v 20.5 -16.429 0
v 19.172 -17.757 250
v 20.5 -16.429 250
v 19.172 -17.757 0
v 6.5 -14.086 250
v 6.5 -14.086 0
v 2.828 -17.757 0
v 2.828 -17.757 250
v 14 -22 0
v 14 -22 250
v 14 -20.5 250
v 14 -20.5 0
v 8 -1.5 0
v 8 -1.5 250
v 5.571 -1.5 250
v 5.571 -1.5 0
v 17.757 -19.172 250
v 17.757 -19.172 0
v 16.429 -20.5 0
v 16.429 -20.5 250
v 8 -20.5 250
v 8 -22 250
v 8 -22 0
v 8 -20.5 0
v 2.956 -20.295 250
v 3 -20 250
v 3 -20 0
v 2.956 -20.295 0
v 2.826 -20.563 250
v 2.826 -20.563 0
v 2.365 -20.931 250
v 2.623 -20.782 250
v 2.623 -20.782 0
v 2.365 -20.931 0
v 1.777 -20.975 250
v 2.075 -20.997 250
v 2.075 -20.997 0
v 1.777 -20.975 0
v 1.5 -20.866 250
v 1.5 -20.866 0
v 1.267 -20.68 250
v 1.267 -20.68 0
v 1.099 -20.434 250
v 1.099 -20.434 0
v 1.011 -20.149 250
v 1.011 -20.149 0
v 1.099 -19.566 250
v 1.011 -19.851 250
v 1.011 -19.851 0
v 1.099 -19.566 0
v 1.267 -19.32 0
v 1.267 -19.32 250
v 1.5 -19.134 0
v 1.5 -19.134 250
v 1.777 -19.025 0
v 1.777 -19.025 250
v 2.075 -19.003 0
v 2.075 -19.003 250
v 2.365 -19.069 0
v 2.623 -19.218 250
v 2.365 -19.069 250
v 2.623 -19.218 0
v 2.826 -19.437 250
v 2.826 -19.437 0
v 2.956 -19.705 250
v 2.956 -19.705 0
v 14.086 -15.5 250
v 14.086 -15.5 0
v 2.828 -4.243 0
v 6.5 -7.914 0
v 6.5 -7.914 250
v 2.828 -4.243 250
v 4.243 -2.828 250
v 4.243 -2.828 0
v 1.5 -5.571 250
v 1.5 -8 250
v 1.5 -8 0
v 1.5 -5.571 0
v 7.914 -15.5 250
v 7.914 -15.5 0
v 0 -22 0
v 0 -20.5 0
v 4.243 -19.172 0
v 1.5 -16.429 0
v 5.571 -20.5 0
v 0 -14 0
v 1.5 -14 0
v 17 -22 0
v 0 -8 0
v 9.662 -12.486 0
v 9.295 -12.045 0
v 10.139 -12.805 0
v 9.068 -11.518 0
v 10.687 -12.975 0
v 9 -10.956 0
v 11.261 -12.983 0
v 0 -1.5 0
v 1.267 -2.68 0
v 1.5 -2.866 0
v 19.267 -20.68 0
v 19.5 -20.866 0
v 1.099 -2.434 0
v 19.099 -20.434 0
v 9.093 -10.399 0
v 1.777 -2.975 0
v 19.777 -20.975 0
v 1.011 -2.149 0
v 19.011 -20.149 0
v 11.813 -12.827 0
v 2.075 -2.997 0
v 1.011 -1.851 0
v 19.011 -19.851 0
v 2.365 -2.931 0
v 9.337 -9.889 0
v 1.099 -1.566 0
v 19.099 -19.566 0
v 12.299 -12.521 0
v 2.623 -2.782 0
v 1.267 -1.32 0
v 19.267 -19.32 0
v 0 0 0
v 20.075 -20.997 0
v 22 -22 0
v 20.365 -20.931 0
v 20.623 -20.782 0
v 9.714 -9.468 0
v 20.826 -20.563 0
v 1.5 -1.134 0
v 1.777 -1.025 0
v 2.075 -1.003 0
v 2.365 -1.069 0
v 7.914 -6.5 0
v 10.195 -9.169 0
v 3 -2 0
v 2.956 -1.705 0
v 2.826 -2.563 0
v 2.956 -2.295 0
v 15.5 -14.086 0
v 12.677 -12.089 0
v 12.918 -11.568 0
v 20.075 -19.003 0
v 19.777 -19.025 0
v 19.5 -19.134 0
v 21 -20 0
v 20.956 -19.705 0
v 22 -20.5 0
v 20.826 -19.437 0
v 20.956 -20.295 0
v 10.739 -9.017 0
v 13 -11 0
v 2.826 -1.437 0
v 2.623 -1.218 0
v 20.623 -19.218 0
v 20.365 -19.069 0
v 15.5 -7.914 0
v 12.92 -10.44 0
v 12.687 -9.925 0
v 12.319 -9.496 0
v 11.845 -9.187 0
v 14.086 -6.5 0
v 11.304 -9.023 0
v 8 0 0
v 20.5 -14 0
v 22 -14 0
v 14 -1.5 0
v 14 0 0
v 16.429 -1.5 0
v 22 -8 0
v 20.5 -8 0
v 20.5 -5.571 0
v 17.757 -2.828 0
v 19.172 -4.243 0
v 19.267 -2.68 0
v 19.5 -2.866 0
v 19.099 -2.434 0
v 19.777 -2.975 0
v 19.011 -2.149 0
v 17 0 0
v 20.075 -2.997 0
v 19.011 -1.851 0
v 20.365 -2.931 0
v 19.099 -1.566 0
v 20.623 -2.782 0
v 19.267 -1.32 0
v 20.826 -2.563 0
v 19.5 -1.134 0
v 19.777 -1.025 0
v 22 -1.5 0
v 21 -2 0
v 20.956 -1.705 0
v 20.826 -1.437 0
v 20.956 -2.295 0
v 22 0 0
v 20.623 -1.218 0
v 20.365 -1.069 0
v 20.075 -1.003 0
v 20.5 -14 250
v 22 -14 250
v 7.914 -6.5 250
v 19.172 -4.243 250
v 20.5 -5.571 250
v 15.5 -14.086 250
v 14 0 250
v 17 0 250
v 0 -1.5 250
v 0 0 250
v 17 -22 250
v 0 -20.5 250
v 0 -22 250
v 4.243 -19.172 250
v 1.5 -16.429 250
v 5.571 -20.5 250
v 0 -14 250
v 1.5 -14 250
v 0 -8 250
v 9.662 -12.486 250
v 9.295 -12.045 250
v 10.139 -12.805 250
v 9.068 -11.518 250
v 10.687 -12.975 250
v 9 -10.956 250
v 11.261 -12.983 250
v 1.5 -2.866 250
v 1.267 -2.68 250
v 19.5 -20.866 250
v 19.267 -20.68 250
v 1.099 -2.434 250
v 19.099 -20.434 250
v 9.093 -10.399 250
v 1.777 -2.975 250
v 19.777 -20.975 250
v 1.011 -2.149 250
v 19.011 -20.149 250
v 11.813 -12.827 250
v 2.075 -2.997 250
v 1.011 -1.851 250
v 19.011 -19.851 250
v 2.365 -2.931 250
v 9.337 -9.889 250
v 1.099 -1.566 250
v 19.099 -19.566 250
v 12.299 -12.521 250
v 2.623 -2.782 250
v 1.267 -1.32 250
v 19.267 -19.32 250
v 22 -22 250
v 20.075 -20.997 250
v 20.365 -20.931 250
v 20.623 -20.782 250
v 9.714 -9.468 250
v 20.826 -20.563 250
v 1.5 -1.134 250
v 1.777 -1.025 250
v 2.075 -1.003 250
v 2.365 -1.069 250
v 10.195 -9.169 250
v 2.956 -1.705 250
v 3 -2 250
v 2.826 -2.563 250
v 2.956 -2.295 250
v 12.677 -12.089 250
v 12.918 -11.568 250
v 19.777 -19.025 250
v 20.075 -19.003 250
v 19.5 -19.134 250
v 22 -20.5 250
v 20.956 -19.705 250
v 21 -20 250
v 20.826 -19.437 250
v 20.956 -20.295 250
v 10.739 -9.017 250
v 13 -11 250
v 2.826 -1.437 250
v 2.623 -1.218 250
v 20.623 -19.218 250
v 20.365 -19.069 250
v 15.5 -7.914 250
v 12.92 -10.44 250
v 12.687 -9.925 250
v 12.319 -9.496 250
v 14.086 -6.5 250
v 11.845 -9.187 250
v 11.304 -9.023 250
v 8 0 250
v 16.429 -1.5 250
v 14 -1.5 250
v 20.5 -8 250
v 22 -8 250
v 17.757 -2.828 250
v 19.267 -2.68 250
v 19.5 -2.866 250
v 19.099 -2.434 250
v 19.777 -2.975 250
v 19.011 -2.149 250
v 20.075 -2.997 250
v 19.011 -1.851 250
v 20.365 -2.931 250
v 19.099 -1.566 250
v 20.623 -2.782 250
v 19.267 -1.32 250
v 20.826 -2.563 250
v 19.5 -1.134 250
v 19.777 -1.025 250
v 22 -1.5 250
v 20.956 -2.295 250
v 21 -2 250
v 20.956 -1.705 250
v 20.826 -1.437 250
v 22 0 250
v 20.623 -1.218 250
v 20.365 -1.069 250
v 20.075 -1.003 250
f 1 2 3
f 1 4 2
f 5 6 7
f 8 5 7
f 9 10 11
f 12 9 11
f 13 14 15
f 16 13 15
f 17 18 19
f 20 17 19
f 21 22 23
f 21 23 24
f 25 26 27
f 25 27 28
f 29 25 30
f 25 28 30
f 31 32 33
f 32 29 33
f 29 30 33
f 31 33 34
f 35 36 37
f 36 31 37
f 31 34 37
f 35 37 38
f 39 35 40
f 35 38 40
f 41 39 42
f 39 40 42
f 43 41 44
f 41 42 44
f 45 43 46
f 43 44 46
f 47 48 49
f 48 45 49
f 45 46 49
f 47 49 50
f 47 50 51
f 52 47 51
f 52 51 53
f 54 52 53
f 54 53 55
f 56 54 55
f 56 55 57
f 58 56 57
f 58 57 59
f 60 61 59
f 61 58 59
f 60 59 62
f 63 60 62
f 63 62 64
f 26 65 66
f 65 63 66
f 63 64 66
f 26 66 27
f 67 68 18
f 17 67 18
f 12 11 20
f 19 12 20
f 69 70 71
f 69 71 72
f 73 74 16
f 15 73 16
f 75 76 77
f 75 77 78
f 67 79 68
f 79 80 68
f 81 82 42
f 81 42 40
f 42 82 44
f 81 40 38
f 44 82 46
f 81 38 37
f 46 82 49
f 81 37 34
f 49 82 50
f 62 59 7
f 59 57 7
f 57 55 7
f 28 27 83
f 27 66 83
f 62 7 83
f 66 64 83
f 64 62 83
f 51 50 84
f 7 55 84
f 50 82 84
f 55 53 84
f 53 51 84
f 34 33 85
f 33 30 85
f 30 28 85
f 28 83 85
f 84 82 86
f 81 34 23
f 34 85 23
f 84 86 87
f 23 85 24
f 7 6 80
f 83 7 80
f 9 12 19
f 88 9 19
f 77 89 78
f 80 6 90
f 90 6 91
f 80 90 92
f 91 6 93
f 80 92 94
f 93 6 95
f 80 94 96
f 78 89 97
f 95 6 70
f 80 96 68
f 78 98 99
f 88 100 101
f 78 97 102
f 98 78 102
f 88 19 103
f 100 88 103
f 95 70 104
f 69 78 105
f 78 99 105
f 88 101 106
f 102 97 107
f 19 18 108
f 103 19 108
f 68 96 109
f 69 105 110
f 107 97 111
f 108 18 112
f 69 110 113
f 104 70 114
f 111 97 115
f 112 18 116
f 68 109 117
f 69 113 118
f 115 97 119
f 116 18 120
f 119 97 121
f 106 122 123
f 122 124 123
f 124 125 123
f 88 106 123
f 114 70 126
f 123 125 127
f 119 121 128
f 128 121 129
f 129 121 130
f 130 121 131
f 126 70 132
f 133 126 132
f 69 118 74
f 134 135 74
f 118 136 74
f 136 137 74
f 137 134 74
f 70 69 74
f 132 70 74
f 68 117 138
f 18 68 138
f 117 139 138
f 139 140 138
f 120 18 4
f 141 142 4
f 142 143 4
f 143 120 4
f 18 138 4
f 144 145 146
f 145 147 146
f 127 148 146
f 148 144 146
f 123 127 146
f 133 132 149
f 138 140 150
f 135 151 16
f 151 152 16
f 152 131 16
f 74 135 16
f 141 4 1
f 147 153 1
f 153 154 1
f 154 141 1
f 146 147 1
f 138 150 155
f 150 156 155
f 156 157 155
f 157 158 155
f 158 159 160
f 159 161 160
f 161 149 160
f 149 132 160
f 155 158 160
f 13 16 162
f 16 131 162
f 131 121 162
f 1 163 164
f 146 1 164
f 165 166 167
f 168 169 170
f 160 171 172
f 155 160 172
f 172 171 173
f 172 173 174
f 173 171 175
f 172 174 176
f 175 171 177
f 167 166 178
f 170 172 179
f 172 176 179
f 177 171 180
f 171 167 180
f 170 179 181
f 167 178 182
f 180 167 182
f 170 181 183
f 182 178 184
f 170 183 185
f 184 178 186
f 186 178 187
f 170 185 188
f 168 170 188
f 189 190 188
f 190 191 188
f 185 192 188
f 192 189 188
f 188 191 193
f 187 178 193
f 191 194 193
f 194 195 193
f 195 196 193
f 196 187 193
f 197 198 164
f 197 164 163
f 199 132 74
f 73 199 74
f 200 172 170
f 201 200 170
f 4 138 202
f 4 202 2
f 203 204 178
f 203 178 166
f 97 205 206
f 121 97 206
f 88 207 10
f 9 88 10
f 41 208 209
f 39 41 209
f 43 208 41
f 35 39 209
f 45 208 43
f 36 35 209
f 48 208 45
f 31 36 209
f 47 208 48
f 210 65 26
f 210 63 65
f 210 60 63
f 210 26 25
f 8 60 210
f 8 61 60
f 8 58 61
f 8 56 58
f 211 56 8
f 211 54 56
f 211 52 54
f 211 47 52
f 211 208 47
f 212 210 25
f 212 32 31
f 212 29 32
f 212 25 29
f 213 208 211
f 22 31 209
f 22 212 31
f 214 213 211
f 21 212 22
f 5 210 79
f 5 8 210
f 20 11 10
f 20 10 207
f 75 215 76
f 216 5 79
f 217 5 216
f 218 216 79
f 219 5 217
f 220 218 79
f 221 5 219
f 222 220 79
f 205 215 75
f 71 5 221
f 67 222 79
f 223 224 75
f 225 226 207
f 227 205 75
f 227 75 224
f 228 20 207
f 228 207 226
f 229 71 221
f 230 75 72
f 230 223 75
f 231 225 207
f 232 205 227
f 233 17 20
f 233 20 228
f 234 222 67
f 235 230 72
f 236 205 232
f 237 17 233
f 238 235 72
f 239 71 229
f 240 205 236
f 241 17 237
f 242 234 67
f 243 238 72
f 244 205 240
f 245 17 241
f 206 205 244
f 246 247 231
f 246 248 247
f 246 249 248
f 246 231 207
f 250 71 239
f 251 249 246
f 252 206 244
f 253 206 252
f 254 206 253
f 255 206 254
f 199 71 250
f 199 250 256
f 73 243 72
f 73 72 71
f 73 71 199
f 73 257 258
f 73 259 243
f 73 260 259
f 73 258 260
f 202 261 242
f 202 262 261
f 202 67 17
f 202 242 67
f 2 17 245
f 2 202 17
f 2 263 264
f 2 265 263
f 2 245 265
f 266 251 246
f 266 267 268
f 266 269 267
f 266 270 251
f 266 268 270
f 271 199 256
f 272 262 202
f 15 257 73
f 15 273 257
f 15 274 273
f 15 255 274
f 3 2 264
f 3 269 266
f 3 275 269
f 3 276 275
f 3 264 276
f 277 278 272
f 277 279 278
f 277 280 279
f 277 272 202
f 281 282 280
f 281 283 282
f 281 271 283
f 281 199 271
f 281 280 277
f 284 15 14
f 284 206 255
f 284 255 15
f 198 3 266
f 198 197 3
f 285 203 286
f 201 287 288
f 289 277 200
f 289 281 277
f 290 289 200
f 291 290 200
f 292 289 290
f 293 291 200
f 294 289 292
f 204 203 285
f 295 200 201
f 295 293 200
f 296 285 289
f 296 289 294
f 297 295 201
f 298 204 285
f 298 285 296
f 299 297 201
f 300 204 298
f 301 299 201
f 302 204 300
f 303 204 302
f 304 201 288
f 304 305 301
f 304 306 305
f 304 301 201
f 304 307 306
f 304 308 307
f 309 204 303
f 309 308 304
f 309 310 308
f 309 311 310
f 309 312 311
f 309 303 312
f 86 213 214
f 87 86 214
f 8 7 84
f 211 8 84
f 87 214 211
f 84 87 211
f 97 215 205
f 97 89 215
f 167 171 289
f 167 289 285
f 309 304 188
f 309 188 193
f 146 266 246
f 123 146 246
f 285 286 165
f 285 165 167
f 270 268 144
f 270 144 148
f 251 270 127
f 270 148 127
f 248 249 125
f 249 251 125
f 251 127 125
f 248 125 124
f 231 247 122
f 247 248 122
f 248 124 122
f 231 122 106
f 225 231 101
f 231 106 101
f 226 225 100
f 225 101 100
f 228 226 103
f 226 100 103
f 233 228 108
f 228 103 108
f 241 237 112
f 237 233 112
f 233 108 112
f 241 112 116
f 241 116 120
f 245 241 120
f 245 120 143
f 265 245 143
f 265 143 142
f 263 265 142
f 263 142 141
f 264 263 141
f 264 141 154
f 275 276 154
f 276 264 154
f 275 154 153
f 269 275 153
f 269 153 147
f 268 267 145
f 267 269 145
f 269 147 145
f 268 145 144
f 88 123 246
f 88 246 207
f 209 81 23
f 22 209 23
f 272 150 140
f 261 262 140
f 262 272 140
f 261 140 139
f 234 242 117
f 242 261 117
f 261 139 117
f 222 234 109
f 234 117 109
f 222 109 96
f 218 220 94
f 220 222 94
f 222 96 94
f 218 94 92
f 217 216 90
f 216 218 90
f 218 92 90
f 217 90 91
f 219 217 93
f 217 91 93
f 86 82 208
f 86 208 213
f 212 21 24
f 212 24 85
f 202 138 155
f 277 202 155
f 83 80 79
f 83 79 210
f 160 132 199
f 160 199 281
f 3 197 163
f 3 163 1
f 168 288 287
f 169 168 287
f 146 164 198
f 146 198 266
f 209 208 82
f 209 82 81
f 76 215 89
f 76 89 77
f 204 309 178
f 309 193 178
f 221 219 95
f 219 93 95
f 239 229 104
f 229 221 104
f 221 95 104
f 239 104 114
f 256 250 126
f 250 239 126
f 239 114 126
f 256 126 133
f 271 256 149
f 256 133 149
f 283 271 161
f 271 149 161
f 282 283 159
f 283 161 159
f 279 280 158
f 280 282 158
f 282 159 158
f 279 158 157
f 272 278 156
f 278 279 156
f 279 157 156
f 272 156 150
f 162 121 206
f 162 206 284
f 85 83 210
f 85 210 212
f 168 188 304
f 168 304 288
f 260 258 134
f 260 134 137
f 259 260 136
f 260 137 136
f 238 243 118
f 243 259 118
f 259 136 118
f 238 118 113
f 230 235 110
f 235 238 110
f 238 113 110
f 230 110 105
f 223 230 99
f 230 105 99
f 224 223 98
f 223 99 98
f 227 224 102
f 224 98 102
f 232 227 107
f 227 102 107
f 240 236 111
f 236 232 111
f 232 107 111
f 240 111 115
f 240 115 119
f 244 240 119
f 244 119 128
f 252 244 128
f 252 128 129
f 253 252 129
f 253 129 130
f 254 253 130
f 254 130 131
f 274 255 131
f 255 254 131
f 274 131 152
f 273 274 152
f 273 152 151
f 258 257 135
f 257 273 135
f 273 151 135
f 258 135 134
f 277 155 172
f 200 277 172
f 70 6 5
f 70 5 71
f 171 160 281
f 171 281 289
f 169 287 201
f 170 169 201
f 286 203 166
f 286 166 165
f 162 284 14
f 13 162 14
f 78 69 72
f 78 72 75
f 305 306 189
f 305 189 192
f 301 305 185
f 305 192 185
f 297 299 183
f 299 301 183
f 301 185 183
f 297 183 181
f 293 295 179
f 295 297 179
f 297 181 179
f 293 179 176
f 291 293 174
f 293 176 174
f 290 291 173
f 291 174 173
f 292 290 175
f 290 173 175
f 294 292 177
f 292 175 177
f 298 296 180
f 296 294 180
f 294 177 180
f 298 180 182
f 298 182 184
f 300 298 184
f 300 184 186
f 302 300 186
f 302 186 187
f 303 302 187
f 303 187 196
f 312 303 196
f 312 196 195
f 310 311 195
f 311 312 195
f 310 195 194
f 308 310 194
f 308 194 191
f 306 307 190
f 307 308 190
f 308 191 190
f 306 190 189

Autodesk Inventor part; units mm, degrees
ref_plane "YZ Plane" through (0, 0, 0) normal (1, 0, 0) x (0, 1, 0)
ref_plane "XZ Plane" through (0, 0, 0) normal (0, 1, 0) x (-1, 0, 0)
ref_plane "XY Plane" through (0, 0, 0) normal (0, 0, 1) x (1, 0, 0)
sketch "Sketch1" plane through (0, 0, 0) normal (0, 0, 1) x (1, 0, 0)
  line L0 (0, 0) -> (8, 0)
  line L1 (8, 0) -> (8, -1.5)
  line L2 (8, -1.5) -> (5.5711, -1.5)
  line L3 (0, -1.5) -> (0, 0)
  line L4 (0, 0) -> (5, 0) construction
  line L5 (4.2426, -2.8284) -> (5.5711, -1.5)
  line L6 (6.5, -14.0858) -> (6.5, -7.9142)
  line L7 (7.9142, -6.5) -> (15.5, -6.5)
  line L8 (0, -8) -> (1.5, -8)
  line L9 (1.5, -8) -> (1.5, -5.5711)
  line L10 (11, -11) -> (10.2929, -10.2929) construction
  line L11 (11, -11) -> (10.2929, -11.7071) construction
  line L12 (0, 0) -> (8, 0)
  line L13 (5.5711, -1.5) -> (4.2426, -2.8284)
  line L14 (2.8284, -4.2426) -> (1.5, -5.5711)
  line L15 (7.9142, -6.5) -> (4.2426, -2.8284)
  line L16 (6.5, -7.9142) -> (2.8284, -4.2426)
  circle A0 centre (11, -11) radius 2
  line L17 (11, -11) -> (16.6687, -11) construction
  line L18 (11, -16.9105) -> (11, -11) construction
  line L19 (22, 0) -> (14, 0)
  line L20 (14, 0) -> (14, -1.5)
  line L21 (14, -1.5) -> (16.4289, -1.5)
  line L22 (22, -1.5) -> (22, 0)
  line L23 (22, 0) -> (17, 0)
  line L24 (17.7574, -2.8284) -> (16.4289, -1.5)
  line L25 (15.5, -15.5) -> (15.5, -7.9142)
  line L26 (15.5, -6.5) -> (7.9142, -6.5)
  line L27 (22, -8) -> (20.5, -8)
  line L28 (20.5, -8) -> (20.5, -5.5711)
  line L29 (11, -11) -> (11.7071, -10.2929) construction
  line L30 (11, -11) -> (11.7071, -11.7071) construction
  line L31 (22, 0) -> (14, 0)
  line L32 (16.4289, -1.5) -> (17.7574, -2.8284)
  line L33 (19.1716, -4.2426) -> (20.5, -5.5711)
  line L34 (14.0858, -6.5) -> (17.7574, -2.8284)
  line L35 (15.5, -7.9142) -> (19.1716, -4.2426)
  circle A1 centre (11, -11) radius 2
  line L36 (0, -22) -> (8, -22)
  line L37 (8, -22) -> (8, -20.5)
  line L38 (8, -20.5) -> (5.5711, -20.5)
  line L39 (0, -20.5) -> (0, -22)
  line L40 (0, -22) -> (5, -22) construction
  line L41 (4.2426, -19.1716) -> (5.5711, -20.5)
  line L42 (6.5, -7.9142) -> (6.5, -14.0858)
  line L43 (6.5, -15.5) -> (14.0858, -15.5)
  line L44 (0, -14) -> (1.5, -14)
  line L45 (1.5, -14) -> (1.5, -16.4289)
  line L46 (11, -11) -> (10.2929, -11.7071) construction
  line L47 (11, -11) -> (10.2929, -10.2929) construction
  line L48 (0, -22) -> (8, -22)
  line L49 (5.5711, -20.5) -> (4.2426, -19.1716)
  line L50 (2.8284, -17.7574) -> (1.5, -16.4289)
  line L51 (7.9142, -15.5) -> (4.2426, -19.1716)
  line L52 (6.5, -14.0858) -> (2.8284, -17.7574)
  circle A2 centre (11, -11) radius 2
  line L53 (22, -22) -> (14, -22)
  line L54 (14, -22) -> (14, -20.5)
  line L55 (14, -20.5) -> (16.4289, -20.5)
  line L56 (22, -20.5) -> (22, -22)
  line L57 (22, -22) -> (17, -22)
  line L58 (17.7574, -19.1716) -> (16.4289, -20.5)
  line L59 (20.5, -14) -> (20.5, -16.4289)
  line L60 (15.5, -14.0858) -> (19.1716, -17.7574)
  line L61 (19.1716, -17.7574) -> (20.5, -16.4289)
  line L62 (14.0858, -15.5) -> (17.7574, -19.1716)
  line L63 (16.4289, -20.5) -> (17.7574, -19.1716)
  line L64 (22, -22) -> (14, -22)
  line L65 (22, -14) -> (20.5, -14)
  line L66 (11, -11) -> (11.7071, -11.7071) construction
  line L67 (11, -11) -> (11.7071, -10.2929) construction
  line L68 (14.0858, -15.5) -> (6.5, -15.5)
  line L69 (15.5, -7.9142) -> (15.5, -15.5)
  circle A3 centre (11, -11) radius 2
  line L70 (22, -14) -> (22, -20.5)
  line L71 (22, -1.5) -> (22, -8)
  line L72 (8, 0) -> (0, 0) construction
  line L73 (0, 0) -> (0, -8) construction
  line L74 (9.5858, -11) -> (9.0681, -11.5176)
  line L75 (6.5, -14.0858) -> (2.8284, -17.7574)
  line L76 (0, -22) -> (0, -14)
  line L77 (0, -8) -> (0, 0)
  line L78 (0, 0) -> (2, 0) construction
  line L79 (2, 0) -> (2, -2) construction
  circle A4 centre (2, -2) radius 1
  circle A5 centre (20, -2) radius 1
  circle A6 centre (2, -20) radius 1
  circle A7 centre (20, -20) radius 1
  point P0 (3.5355, -3.5355)
  point P1 (0, -7.0711)
  point P2 (6.5, -6.5)
  point P3 (6.5, -15.5)
  point P4 (1.5, 0)
  point P5 (10.2929, -10.2929)
  point P6 (18.4645, -3.5355)
  point P7 (22, -7.0711)
  point P8 (6.5, -6.5)
  point P9 (20.5, 0)
  point P10 (11.7071, -10.2929)
  point P11 (12.4142, -11)
  point P12 (3.5355, -18.4645)
  point P13 (0, -14.9289)
  point P14 (6.5, -6.5)
  point P15 (1.5, -22)
  point P16 (10.2929, -11.7071)
  point P17 (18.4645, -18.4645)
  point P18 (20.5, -22)
  point P19 (22, -14.9289)
  point P20 (15.5, -6.5)
  point P21 (11.7071, -11.7071)
  dimension "d2" = 8
  dimension "d3" = 1.5
  dimension "d4" = 5
  dimension "d10" = 9
  dimension "d11" = 9
  dimension "d14" = 4
  dimension "d15" = 2
  dimension "d16" = 2
  dimension "d17" = 2
extrude "Extrusion1" add sketch "Sketch1" along normal blind 250
properties part number "extrusion_250"
